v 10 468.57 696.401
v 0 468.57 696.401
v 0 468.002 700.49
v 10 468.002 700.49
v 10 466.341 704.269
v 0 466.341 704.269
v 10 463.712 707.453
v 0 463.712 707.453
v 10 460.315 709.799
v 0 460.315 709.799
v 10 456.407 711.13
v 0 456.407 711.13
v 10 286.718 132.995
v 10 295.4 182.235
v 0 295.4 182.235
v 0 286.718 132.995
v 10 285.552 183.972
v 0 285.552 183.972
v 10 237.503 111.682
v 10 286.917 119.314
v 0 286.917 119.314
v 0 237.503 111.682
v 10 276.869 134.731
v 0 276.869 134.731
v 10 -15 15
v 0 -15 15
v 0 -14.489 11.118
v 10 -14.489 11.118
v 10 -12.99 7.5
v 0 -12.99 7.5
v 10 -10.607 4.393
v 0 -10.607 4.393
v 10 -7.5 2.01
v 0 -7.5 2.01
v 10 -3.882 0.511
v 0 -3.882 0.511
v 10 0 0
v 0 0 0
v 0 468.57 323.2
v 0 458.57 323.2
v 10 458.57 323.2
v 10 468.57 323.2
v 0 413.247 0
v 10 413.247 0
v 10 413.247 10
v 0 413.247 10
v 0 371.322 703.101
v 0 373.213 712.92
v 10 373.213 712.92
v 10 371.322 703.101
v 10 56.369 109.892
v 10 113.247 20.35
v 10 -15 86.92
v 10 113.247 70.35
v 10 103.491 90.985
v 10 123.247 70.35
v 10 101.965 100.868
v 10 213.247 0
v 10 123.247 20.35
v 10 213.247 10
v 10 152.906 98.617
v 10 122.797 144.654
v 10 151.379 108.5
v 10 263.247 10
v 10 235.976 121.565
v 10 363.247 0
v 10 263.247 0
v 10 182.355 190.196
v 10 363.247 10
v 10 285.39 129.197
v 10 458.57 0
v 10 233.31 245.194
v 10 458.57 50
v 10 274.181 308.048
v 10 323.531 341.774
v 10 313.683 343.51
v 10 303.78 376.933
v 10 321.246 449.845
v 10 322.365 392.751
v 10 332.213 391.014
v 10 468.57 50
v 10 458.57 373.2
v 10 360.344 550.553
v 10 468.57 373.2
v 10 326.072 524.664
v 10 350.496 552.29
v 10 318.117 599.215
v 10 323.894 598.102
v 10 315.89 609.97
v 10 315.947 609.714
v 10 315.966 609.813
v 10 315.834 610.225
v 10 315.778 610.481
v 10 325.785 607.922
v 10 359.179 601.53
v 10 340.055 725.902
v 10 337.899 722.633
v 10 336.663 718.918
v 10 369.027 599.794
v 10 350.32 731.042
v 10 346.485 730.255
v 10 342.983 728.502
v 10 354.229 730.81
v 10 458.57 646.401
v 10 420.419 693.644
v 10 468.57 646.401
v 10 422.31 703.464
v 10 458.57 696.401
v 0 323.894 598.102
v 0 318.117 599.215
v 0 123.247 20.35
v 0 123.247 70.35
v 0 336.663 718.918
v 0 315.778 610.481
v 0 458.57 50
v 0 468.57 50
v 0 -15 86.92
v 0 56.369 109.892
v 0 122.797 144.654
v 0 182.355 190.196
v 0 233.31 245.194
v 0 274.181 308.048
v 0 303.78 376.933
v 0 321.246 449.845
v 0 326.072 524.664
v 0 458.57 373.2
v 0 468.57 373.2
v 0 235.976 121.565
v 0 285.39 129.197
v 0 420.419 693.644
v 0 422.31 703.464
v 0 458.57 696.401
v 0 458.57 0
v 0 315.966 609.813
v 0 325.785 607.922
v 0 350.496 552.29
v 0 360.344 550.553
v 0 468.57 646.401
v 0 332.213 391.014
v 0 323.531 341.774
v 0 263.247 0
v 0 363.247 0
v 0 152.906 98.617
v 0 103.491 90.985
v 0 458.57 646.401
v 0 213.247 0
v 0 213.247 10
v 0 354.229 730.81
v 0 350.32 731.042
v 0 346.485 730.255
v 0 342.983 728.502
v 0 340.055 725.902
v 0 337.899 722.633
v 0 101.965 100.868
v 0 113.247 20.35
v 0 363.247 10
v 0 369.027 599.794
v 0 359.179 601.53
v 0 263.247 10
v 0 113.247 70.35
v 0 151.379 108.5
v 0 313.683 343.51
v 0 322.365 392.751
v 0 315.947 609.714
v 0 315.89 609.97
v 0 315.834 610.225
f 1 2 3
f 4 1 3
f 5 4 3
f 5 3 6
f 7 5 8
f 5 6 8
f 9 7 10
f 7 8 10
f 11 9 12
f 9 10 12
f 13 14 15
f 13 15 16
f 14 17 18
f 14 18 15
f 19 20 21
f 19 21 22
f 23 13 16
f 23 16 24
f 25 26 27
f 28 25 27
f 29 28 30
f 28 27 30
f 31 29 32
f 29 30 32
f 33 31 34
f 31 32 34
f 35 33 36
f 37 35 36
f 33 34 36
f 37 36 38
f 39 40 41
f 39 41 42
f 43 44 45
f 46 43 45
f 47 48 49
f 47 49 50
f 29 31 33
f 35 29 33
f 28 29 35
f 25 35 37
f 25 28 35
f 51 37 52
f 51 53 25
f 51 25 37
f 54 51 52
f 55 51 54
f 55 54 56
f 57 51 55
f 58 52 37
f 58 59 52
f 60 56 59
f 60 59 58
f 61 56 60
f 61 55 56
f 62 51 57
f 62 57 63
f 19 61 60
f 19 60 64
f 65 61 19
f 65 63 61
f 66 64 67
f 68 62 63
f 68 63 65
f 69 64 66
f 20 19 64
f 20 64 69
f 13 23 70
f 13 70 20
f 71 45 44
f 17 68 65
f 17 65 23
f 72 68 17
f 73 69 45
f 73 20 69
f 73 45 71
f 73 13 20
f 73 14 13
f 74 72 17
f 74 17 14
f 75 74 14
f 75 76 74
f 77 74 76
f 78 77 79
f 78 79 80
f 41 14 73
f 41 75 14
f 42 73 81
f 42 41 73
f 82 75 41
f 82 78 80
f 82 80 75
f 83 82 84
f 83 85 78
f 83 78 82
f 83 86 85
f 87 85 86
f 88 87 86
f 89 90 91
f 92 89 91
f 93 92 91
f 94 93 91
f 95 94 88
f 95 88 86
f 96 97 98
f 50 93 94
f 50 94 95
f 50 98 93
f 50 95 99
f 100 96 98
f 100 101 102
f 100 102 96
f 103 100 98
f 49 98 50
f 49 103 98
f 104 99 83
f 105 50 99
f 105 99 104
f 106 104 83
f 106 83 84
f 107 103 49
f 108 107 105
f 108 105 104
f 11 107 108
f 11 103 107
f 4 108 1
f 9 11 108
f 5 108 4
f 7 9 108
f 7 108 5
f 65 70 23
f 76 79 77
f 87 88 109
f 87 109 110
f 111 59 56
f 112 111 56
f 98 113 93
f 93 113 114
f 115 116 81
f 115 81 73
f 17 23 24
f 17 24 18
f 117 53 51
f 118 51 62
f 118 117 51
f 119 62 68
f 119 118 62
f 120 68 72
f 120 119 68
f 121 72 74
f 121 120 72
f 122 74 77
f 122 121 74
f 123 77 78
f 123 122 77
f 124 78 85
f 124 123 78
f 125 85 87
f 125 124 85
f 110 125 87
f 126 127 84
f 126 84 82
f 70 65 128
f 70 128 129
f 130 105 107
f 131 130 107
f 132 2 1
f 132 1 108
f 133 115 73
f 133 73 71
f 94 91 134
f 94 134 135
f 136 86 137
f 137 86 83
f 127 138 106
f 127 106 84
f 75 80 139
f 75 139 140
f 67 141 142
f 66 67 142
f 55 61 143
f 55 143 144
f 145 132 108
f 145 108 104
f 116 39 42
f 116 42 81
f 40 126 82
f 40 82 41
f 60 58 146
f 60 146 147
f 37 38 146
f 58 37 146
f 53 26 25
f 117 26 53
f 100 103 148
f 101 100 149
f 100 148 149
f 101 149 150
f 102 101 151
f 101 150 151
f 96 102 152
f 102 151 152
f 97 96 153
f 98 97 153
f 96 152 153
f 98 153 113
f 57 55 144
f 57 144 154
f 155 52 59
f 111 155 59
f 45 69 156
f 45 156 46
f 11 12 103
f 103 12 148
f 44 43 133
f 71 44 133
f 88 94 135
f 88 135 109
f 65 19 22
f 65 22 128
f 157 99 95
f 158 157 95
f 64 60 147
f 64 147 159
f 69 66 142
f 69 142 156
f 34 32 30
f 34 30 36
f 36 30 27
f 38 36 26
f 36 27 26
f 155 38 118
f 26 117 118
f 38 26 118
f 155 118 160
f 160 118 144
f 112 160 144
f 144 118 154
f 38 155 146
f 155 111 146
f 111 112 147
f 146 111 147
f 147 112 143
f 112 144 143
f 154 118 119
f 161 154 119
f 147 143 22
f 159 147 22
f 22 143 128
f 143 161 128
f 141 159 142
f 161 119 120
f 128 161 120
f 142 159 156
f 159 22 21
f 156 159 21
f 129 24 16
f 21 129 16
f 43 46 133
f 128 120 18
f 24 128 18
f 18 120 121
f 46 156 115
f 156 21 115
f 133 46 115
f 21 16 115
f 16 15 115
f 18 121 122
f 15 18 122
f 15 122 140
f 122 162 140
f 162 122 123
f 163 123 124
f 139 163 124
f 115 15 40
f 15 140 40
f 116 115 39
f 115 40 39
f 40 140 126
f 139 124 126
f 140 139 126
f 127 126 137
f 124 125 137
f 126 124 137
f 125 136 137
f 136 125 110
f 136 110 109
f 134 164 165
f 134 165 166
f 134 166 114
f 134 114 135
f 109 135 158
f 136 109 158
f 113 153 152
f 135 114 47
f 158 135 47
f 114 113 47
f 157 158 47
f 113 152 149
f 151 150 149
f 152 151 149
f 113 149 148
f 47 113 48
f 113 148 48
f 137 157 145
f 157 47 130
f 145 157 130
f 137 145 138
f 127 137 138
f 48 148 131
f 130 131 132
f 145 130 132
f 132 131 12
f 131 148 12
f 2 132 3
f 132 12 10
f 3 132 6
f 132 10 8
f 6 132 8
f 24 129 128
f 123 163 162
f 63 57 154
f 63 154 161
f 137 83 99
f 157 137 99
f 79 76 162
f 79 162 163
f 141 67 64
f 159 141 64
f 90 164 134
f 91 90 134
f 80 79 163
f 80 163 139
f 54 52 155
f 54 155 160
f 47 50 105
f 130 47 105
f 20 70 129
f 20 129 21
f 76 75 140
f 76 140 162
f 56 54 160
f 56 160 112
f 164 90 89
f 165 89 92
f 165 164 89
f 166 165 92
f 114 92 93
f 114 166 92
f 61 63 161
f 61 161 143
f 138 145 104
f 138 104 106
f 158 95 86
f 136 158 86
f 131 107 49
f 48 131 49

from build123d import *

# Parameters (mm, degrees)
PAD_DEPTH       = 10
SKETCH001_W     = 10
SKETCH001_H     = 50
SKETCH001_W_2   = 50
SKETCH001_H_2   = 10
POCKET_DEPTH    = 10.001
POCKET001_DEPTH = 10.001


with BuildPart() as part:
    # Sketch → Pad (new body)
    with BuildSketch(Plane.YZ):
        with BuildLine():
            Line((0, 0), (458.57, 0))
            Line((458.57, 50), (458.57, 0))
            Line((468.57, 50), (458.57, 50))
            Line((468.57, 323.200359), (468.57, 50))
            Line((458.57, 323.200359), (468.57, 323.200359))
            Line((458.57, 373.200359), (458.57, 323.200359))
            Line((468.57, 373.200359), (458.57, 373.200359))
            Line((468.57, 646.400718), (468.57, 373.200359))
            Line((458.57, 646.400718), (468.57, 646.400718))
            Line((458.57, 696.400718), (458.57, 646.400718))
            Line((468.57, 696.400718), (458.57, 696.400718))
            ThreePointArc((468.57, 696.400718), (465.136205, 705.951787), (456.406946, 711.13))
            Line((456.406946, 711.13), (354.229363, 730.81))
            ThreePointArc((354.229363, 730.81), (342.983266, 728.501917), (336.663136, 718.917664))
            Line((336.663136, 718.917664), (315.777541, 610.480692))
            ThreePointArc((-15, 86.92), (258.192075, 280.591887), (315.777541, 610.480692))
            Line((-15, 15), (-15, 86.92))
            ThreePointArc((-15, 15), (-10.606602, 4.393398), (0, 0))
        make_face()
    extrude(amount=PAD_DEPTH)

    # Sketch001 → Pocket (cut, through all)
    with BuildSketch(Plane.YZ.offset(10)):
        Polygon((276.869428, 134.731244), (285.551837, 183.971631), (295.399915, 182.235149), (286.717506, 132.994762), align=None)
        Polygon((313.682842, 343.510487), (322.365251, 392.750875), (332.213328, 391.014393), (323.530919, 341.774005), align=None)
        Polygon((359.178664, 601.530119), (350.496255, 552.289731), (360.344333, 550.553249), (369.026742, 599.793637), align=None)
        Polygon((101.965072, 100.867809), (151.379199, 108.499589), (152.905555, 98.616763), (103.491428, 90.984984), align=None)
        Polygon((235.976184, 121.565195), (285.390311, 129.196975), (286.916667, 119.31415), (237.50254, 111.68237), align=None)
        with Locations((118.247, 45.35)):
            Rectangle(SKETCH001_W, SKETCH001_H)
        with Locations((238.247, 5)):
            Rectangle(SKETCH001_W_2, SKETCH001_H_2)
        with Locations((388.247, 5)):
            Rectangle(SKETCH001_W_2, SKETCH001_H_2)
    extrude(amount=-POCKET_DEPTH, mode=Mode.SUBTRACT)

    # Sketch002 → Pocket001 (cut, through all)
    with BuildSketch(Plane.YZ.offset(10)):
        Polygon((422.310473, 703.463594), (373.212868, 712.92008), (371.321571, 703.100559), (420.419176, 693.644073), align=None)
        Polygon((315.96561, 609.813), (325.785131, 607.921703), (323.893833, 598.102182), (314.074312, 599.993479), align=None)
    extrude(amount=-POCKET001_DEPTH, mode=Mode.SUBTRACT)


solid = part.part
